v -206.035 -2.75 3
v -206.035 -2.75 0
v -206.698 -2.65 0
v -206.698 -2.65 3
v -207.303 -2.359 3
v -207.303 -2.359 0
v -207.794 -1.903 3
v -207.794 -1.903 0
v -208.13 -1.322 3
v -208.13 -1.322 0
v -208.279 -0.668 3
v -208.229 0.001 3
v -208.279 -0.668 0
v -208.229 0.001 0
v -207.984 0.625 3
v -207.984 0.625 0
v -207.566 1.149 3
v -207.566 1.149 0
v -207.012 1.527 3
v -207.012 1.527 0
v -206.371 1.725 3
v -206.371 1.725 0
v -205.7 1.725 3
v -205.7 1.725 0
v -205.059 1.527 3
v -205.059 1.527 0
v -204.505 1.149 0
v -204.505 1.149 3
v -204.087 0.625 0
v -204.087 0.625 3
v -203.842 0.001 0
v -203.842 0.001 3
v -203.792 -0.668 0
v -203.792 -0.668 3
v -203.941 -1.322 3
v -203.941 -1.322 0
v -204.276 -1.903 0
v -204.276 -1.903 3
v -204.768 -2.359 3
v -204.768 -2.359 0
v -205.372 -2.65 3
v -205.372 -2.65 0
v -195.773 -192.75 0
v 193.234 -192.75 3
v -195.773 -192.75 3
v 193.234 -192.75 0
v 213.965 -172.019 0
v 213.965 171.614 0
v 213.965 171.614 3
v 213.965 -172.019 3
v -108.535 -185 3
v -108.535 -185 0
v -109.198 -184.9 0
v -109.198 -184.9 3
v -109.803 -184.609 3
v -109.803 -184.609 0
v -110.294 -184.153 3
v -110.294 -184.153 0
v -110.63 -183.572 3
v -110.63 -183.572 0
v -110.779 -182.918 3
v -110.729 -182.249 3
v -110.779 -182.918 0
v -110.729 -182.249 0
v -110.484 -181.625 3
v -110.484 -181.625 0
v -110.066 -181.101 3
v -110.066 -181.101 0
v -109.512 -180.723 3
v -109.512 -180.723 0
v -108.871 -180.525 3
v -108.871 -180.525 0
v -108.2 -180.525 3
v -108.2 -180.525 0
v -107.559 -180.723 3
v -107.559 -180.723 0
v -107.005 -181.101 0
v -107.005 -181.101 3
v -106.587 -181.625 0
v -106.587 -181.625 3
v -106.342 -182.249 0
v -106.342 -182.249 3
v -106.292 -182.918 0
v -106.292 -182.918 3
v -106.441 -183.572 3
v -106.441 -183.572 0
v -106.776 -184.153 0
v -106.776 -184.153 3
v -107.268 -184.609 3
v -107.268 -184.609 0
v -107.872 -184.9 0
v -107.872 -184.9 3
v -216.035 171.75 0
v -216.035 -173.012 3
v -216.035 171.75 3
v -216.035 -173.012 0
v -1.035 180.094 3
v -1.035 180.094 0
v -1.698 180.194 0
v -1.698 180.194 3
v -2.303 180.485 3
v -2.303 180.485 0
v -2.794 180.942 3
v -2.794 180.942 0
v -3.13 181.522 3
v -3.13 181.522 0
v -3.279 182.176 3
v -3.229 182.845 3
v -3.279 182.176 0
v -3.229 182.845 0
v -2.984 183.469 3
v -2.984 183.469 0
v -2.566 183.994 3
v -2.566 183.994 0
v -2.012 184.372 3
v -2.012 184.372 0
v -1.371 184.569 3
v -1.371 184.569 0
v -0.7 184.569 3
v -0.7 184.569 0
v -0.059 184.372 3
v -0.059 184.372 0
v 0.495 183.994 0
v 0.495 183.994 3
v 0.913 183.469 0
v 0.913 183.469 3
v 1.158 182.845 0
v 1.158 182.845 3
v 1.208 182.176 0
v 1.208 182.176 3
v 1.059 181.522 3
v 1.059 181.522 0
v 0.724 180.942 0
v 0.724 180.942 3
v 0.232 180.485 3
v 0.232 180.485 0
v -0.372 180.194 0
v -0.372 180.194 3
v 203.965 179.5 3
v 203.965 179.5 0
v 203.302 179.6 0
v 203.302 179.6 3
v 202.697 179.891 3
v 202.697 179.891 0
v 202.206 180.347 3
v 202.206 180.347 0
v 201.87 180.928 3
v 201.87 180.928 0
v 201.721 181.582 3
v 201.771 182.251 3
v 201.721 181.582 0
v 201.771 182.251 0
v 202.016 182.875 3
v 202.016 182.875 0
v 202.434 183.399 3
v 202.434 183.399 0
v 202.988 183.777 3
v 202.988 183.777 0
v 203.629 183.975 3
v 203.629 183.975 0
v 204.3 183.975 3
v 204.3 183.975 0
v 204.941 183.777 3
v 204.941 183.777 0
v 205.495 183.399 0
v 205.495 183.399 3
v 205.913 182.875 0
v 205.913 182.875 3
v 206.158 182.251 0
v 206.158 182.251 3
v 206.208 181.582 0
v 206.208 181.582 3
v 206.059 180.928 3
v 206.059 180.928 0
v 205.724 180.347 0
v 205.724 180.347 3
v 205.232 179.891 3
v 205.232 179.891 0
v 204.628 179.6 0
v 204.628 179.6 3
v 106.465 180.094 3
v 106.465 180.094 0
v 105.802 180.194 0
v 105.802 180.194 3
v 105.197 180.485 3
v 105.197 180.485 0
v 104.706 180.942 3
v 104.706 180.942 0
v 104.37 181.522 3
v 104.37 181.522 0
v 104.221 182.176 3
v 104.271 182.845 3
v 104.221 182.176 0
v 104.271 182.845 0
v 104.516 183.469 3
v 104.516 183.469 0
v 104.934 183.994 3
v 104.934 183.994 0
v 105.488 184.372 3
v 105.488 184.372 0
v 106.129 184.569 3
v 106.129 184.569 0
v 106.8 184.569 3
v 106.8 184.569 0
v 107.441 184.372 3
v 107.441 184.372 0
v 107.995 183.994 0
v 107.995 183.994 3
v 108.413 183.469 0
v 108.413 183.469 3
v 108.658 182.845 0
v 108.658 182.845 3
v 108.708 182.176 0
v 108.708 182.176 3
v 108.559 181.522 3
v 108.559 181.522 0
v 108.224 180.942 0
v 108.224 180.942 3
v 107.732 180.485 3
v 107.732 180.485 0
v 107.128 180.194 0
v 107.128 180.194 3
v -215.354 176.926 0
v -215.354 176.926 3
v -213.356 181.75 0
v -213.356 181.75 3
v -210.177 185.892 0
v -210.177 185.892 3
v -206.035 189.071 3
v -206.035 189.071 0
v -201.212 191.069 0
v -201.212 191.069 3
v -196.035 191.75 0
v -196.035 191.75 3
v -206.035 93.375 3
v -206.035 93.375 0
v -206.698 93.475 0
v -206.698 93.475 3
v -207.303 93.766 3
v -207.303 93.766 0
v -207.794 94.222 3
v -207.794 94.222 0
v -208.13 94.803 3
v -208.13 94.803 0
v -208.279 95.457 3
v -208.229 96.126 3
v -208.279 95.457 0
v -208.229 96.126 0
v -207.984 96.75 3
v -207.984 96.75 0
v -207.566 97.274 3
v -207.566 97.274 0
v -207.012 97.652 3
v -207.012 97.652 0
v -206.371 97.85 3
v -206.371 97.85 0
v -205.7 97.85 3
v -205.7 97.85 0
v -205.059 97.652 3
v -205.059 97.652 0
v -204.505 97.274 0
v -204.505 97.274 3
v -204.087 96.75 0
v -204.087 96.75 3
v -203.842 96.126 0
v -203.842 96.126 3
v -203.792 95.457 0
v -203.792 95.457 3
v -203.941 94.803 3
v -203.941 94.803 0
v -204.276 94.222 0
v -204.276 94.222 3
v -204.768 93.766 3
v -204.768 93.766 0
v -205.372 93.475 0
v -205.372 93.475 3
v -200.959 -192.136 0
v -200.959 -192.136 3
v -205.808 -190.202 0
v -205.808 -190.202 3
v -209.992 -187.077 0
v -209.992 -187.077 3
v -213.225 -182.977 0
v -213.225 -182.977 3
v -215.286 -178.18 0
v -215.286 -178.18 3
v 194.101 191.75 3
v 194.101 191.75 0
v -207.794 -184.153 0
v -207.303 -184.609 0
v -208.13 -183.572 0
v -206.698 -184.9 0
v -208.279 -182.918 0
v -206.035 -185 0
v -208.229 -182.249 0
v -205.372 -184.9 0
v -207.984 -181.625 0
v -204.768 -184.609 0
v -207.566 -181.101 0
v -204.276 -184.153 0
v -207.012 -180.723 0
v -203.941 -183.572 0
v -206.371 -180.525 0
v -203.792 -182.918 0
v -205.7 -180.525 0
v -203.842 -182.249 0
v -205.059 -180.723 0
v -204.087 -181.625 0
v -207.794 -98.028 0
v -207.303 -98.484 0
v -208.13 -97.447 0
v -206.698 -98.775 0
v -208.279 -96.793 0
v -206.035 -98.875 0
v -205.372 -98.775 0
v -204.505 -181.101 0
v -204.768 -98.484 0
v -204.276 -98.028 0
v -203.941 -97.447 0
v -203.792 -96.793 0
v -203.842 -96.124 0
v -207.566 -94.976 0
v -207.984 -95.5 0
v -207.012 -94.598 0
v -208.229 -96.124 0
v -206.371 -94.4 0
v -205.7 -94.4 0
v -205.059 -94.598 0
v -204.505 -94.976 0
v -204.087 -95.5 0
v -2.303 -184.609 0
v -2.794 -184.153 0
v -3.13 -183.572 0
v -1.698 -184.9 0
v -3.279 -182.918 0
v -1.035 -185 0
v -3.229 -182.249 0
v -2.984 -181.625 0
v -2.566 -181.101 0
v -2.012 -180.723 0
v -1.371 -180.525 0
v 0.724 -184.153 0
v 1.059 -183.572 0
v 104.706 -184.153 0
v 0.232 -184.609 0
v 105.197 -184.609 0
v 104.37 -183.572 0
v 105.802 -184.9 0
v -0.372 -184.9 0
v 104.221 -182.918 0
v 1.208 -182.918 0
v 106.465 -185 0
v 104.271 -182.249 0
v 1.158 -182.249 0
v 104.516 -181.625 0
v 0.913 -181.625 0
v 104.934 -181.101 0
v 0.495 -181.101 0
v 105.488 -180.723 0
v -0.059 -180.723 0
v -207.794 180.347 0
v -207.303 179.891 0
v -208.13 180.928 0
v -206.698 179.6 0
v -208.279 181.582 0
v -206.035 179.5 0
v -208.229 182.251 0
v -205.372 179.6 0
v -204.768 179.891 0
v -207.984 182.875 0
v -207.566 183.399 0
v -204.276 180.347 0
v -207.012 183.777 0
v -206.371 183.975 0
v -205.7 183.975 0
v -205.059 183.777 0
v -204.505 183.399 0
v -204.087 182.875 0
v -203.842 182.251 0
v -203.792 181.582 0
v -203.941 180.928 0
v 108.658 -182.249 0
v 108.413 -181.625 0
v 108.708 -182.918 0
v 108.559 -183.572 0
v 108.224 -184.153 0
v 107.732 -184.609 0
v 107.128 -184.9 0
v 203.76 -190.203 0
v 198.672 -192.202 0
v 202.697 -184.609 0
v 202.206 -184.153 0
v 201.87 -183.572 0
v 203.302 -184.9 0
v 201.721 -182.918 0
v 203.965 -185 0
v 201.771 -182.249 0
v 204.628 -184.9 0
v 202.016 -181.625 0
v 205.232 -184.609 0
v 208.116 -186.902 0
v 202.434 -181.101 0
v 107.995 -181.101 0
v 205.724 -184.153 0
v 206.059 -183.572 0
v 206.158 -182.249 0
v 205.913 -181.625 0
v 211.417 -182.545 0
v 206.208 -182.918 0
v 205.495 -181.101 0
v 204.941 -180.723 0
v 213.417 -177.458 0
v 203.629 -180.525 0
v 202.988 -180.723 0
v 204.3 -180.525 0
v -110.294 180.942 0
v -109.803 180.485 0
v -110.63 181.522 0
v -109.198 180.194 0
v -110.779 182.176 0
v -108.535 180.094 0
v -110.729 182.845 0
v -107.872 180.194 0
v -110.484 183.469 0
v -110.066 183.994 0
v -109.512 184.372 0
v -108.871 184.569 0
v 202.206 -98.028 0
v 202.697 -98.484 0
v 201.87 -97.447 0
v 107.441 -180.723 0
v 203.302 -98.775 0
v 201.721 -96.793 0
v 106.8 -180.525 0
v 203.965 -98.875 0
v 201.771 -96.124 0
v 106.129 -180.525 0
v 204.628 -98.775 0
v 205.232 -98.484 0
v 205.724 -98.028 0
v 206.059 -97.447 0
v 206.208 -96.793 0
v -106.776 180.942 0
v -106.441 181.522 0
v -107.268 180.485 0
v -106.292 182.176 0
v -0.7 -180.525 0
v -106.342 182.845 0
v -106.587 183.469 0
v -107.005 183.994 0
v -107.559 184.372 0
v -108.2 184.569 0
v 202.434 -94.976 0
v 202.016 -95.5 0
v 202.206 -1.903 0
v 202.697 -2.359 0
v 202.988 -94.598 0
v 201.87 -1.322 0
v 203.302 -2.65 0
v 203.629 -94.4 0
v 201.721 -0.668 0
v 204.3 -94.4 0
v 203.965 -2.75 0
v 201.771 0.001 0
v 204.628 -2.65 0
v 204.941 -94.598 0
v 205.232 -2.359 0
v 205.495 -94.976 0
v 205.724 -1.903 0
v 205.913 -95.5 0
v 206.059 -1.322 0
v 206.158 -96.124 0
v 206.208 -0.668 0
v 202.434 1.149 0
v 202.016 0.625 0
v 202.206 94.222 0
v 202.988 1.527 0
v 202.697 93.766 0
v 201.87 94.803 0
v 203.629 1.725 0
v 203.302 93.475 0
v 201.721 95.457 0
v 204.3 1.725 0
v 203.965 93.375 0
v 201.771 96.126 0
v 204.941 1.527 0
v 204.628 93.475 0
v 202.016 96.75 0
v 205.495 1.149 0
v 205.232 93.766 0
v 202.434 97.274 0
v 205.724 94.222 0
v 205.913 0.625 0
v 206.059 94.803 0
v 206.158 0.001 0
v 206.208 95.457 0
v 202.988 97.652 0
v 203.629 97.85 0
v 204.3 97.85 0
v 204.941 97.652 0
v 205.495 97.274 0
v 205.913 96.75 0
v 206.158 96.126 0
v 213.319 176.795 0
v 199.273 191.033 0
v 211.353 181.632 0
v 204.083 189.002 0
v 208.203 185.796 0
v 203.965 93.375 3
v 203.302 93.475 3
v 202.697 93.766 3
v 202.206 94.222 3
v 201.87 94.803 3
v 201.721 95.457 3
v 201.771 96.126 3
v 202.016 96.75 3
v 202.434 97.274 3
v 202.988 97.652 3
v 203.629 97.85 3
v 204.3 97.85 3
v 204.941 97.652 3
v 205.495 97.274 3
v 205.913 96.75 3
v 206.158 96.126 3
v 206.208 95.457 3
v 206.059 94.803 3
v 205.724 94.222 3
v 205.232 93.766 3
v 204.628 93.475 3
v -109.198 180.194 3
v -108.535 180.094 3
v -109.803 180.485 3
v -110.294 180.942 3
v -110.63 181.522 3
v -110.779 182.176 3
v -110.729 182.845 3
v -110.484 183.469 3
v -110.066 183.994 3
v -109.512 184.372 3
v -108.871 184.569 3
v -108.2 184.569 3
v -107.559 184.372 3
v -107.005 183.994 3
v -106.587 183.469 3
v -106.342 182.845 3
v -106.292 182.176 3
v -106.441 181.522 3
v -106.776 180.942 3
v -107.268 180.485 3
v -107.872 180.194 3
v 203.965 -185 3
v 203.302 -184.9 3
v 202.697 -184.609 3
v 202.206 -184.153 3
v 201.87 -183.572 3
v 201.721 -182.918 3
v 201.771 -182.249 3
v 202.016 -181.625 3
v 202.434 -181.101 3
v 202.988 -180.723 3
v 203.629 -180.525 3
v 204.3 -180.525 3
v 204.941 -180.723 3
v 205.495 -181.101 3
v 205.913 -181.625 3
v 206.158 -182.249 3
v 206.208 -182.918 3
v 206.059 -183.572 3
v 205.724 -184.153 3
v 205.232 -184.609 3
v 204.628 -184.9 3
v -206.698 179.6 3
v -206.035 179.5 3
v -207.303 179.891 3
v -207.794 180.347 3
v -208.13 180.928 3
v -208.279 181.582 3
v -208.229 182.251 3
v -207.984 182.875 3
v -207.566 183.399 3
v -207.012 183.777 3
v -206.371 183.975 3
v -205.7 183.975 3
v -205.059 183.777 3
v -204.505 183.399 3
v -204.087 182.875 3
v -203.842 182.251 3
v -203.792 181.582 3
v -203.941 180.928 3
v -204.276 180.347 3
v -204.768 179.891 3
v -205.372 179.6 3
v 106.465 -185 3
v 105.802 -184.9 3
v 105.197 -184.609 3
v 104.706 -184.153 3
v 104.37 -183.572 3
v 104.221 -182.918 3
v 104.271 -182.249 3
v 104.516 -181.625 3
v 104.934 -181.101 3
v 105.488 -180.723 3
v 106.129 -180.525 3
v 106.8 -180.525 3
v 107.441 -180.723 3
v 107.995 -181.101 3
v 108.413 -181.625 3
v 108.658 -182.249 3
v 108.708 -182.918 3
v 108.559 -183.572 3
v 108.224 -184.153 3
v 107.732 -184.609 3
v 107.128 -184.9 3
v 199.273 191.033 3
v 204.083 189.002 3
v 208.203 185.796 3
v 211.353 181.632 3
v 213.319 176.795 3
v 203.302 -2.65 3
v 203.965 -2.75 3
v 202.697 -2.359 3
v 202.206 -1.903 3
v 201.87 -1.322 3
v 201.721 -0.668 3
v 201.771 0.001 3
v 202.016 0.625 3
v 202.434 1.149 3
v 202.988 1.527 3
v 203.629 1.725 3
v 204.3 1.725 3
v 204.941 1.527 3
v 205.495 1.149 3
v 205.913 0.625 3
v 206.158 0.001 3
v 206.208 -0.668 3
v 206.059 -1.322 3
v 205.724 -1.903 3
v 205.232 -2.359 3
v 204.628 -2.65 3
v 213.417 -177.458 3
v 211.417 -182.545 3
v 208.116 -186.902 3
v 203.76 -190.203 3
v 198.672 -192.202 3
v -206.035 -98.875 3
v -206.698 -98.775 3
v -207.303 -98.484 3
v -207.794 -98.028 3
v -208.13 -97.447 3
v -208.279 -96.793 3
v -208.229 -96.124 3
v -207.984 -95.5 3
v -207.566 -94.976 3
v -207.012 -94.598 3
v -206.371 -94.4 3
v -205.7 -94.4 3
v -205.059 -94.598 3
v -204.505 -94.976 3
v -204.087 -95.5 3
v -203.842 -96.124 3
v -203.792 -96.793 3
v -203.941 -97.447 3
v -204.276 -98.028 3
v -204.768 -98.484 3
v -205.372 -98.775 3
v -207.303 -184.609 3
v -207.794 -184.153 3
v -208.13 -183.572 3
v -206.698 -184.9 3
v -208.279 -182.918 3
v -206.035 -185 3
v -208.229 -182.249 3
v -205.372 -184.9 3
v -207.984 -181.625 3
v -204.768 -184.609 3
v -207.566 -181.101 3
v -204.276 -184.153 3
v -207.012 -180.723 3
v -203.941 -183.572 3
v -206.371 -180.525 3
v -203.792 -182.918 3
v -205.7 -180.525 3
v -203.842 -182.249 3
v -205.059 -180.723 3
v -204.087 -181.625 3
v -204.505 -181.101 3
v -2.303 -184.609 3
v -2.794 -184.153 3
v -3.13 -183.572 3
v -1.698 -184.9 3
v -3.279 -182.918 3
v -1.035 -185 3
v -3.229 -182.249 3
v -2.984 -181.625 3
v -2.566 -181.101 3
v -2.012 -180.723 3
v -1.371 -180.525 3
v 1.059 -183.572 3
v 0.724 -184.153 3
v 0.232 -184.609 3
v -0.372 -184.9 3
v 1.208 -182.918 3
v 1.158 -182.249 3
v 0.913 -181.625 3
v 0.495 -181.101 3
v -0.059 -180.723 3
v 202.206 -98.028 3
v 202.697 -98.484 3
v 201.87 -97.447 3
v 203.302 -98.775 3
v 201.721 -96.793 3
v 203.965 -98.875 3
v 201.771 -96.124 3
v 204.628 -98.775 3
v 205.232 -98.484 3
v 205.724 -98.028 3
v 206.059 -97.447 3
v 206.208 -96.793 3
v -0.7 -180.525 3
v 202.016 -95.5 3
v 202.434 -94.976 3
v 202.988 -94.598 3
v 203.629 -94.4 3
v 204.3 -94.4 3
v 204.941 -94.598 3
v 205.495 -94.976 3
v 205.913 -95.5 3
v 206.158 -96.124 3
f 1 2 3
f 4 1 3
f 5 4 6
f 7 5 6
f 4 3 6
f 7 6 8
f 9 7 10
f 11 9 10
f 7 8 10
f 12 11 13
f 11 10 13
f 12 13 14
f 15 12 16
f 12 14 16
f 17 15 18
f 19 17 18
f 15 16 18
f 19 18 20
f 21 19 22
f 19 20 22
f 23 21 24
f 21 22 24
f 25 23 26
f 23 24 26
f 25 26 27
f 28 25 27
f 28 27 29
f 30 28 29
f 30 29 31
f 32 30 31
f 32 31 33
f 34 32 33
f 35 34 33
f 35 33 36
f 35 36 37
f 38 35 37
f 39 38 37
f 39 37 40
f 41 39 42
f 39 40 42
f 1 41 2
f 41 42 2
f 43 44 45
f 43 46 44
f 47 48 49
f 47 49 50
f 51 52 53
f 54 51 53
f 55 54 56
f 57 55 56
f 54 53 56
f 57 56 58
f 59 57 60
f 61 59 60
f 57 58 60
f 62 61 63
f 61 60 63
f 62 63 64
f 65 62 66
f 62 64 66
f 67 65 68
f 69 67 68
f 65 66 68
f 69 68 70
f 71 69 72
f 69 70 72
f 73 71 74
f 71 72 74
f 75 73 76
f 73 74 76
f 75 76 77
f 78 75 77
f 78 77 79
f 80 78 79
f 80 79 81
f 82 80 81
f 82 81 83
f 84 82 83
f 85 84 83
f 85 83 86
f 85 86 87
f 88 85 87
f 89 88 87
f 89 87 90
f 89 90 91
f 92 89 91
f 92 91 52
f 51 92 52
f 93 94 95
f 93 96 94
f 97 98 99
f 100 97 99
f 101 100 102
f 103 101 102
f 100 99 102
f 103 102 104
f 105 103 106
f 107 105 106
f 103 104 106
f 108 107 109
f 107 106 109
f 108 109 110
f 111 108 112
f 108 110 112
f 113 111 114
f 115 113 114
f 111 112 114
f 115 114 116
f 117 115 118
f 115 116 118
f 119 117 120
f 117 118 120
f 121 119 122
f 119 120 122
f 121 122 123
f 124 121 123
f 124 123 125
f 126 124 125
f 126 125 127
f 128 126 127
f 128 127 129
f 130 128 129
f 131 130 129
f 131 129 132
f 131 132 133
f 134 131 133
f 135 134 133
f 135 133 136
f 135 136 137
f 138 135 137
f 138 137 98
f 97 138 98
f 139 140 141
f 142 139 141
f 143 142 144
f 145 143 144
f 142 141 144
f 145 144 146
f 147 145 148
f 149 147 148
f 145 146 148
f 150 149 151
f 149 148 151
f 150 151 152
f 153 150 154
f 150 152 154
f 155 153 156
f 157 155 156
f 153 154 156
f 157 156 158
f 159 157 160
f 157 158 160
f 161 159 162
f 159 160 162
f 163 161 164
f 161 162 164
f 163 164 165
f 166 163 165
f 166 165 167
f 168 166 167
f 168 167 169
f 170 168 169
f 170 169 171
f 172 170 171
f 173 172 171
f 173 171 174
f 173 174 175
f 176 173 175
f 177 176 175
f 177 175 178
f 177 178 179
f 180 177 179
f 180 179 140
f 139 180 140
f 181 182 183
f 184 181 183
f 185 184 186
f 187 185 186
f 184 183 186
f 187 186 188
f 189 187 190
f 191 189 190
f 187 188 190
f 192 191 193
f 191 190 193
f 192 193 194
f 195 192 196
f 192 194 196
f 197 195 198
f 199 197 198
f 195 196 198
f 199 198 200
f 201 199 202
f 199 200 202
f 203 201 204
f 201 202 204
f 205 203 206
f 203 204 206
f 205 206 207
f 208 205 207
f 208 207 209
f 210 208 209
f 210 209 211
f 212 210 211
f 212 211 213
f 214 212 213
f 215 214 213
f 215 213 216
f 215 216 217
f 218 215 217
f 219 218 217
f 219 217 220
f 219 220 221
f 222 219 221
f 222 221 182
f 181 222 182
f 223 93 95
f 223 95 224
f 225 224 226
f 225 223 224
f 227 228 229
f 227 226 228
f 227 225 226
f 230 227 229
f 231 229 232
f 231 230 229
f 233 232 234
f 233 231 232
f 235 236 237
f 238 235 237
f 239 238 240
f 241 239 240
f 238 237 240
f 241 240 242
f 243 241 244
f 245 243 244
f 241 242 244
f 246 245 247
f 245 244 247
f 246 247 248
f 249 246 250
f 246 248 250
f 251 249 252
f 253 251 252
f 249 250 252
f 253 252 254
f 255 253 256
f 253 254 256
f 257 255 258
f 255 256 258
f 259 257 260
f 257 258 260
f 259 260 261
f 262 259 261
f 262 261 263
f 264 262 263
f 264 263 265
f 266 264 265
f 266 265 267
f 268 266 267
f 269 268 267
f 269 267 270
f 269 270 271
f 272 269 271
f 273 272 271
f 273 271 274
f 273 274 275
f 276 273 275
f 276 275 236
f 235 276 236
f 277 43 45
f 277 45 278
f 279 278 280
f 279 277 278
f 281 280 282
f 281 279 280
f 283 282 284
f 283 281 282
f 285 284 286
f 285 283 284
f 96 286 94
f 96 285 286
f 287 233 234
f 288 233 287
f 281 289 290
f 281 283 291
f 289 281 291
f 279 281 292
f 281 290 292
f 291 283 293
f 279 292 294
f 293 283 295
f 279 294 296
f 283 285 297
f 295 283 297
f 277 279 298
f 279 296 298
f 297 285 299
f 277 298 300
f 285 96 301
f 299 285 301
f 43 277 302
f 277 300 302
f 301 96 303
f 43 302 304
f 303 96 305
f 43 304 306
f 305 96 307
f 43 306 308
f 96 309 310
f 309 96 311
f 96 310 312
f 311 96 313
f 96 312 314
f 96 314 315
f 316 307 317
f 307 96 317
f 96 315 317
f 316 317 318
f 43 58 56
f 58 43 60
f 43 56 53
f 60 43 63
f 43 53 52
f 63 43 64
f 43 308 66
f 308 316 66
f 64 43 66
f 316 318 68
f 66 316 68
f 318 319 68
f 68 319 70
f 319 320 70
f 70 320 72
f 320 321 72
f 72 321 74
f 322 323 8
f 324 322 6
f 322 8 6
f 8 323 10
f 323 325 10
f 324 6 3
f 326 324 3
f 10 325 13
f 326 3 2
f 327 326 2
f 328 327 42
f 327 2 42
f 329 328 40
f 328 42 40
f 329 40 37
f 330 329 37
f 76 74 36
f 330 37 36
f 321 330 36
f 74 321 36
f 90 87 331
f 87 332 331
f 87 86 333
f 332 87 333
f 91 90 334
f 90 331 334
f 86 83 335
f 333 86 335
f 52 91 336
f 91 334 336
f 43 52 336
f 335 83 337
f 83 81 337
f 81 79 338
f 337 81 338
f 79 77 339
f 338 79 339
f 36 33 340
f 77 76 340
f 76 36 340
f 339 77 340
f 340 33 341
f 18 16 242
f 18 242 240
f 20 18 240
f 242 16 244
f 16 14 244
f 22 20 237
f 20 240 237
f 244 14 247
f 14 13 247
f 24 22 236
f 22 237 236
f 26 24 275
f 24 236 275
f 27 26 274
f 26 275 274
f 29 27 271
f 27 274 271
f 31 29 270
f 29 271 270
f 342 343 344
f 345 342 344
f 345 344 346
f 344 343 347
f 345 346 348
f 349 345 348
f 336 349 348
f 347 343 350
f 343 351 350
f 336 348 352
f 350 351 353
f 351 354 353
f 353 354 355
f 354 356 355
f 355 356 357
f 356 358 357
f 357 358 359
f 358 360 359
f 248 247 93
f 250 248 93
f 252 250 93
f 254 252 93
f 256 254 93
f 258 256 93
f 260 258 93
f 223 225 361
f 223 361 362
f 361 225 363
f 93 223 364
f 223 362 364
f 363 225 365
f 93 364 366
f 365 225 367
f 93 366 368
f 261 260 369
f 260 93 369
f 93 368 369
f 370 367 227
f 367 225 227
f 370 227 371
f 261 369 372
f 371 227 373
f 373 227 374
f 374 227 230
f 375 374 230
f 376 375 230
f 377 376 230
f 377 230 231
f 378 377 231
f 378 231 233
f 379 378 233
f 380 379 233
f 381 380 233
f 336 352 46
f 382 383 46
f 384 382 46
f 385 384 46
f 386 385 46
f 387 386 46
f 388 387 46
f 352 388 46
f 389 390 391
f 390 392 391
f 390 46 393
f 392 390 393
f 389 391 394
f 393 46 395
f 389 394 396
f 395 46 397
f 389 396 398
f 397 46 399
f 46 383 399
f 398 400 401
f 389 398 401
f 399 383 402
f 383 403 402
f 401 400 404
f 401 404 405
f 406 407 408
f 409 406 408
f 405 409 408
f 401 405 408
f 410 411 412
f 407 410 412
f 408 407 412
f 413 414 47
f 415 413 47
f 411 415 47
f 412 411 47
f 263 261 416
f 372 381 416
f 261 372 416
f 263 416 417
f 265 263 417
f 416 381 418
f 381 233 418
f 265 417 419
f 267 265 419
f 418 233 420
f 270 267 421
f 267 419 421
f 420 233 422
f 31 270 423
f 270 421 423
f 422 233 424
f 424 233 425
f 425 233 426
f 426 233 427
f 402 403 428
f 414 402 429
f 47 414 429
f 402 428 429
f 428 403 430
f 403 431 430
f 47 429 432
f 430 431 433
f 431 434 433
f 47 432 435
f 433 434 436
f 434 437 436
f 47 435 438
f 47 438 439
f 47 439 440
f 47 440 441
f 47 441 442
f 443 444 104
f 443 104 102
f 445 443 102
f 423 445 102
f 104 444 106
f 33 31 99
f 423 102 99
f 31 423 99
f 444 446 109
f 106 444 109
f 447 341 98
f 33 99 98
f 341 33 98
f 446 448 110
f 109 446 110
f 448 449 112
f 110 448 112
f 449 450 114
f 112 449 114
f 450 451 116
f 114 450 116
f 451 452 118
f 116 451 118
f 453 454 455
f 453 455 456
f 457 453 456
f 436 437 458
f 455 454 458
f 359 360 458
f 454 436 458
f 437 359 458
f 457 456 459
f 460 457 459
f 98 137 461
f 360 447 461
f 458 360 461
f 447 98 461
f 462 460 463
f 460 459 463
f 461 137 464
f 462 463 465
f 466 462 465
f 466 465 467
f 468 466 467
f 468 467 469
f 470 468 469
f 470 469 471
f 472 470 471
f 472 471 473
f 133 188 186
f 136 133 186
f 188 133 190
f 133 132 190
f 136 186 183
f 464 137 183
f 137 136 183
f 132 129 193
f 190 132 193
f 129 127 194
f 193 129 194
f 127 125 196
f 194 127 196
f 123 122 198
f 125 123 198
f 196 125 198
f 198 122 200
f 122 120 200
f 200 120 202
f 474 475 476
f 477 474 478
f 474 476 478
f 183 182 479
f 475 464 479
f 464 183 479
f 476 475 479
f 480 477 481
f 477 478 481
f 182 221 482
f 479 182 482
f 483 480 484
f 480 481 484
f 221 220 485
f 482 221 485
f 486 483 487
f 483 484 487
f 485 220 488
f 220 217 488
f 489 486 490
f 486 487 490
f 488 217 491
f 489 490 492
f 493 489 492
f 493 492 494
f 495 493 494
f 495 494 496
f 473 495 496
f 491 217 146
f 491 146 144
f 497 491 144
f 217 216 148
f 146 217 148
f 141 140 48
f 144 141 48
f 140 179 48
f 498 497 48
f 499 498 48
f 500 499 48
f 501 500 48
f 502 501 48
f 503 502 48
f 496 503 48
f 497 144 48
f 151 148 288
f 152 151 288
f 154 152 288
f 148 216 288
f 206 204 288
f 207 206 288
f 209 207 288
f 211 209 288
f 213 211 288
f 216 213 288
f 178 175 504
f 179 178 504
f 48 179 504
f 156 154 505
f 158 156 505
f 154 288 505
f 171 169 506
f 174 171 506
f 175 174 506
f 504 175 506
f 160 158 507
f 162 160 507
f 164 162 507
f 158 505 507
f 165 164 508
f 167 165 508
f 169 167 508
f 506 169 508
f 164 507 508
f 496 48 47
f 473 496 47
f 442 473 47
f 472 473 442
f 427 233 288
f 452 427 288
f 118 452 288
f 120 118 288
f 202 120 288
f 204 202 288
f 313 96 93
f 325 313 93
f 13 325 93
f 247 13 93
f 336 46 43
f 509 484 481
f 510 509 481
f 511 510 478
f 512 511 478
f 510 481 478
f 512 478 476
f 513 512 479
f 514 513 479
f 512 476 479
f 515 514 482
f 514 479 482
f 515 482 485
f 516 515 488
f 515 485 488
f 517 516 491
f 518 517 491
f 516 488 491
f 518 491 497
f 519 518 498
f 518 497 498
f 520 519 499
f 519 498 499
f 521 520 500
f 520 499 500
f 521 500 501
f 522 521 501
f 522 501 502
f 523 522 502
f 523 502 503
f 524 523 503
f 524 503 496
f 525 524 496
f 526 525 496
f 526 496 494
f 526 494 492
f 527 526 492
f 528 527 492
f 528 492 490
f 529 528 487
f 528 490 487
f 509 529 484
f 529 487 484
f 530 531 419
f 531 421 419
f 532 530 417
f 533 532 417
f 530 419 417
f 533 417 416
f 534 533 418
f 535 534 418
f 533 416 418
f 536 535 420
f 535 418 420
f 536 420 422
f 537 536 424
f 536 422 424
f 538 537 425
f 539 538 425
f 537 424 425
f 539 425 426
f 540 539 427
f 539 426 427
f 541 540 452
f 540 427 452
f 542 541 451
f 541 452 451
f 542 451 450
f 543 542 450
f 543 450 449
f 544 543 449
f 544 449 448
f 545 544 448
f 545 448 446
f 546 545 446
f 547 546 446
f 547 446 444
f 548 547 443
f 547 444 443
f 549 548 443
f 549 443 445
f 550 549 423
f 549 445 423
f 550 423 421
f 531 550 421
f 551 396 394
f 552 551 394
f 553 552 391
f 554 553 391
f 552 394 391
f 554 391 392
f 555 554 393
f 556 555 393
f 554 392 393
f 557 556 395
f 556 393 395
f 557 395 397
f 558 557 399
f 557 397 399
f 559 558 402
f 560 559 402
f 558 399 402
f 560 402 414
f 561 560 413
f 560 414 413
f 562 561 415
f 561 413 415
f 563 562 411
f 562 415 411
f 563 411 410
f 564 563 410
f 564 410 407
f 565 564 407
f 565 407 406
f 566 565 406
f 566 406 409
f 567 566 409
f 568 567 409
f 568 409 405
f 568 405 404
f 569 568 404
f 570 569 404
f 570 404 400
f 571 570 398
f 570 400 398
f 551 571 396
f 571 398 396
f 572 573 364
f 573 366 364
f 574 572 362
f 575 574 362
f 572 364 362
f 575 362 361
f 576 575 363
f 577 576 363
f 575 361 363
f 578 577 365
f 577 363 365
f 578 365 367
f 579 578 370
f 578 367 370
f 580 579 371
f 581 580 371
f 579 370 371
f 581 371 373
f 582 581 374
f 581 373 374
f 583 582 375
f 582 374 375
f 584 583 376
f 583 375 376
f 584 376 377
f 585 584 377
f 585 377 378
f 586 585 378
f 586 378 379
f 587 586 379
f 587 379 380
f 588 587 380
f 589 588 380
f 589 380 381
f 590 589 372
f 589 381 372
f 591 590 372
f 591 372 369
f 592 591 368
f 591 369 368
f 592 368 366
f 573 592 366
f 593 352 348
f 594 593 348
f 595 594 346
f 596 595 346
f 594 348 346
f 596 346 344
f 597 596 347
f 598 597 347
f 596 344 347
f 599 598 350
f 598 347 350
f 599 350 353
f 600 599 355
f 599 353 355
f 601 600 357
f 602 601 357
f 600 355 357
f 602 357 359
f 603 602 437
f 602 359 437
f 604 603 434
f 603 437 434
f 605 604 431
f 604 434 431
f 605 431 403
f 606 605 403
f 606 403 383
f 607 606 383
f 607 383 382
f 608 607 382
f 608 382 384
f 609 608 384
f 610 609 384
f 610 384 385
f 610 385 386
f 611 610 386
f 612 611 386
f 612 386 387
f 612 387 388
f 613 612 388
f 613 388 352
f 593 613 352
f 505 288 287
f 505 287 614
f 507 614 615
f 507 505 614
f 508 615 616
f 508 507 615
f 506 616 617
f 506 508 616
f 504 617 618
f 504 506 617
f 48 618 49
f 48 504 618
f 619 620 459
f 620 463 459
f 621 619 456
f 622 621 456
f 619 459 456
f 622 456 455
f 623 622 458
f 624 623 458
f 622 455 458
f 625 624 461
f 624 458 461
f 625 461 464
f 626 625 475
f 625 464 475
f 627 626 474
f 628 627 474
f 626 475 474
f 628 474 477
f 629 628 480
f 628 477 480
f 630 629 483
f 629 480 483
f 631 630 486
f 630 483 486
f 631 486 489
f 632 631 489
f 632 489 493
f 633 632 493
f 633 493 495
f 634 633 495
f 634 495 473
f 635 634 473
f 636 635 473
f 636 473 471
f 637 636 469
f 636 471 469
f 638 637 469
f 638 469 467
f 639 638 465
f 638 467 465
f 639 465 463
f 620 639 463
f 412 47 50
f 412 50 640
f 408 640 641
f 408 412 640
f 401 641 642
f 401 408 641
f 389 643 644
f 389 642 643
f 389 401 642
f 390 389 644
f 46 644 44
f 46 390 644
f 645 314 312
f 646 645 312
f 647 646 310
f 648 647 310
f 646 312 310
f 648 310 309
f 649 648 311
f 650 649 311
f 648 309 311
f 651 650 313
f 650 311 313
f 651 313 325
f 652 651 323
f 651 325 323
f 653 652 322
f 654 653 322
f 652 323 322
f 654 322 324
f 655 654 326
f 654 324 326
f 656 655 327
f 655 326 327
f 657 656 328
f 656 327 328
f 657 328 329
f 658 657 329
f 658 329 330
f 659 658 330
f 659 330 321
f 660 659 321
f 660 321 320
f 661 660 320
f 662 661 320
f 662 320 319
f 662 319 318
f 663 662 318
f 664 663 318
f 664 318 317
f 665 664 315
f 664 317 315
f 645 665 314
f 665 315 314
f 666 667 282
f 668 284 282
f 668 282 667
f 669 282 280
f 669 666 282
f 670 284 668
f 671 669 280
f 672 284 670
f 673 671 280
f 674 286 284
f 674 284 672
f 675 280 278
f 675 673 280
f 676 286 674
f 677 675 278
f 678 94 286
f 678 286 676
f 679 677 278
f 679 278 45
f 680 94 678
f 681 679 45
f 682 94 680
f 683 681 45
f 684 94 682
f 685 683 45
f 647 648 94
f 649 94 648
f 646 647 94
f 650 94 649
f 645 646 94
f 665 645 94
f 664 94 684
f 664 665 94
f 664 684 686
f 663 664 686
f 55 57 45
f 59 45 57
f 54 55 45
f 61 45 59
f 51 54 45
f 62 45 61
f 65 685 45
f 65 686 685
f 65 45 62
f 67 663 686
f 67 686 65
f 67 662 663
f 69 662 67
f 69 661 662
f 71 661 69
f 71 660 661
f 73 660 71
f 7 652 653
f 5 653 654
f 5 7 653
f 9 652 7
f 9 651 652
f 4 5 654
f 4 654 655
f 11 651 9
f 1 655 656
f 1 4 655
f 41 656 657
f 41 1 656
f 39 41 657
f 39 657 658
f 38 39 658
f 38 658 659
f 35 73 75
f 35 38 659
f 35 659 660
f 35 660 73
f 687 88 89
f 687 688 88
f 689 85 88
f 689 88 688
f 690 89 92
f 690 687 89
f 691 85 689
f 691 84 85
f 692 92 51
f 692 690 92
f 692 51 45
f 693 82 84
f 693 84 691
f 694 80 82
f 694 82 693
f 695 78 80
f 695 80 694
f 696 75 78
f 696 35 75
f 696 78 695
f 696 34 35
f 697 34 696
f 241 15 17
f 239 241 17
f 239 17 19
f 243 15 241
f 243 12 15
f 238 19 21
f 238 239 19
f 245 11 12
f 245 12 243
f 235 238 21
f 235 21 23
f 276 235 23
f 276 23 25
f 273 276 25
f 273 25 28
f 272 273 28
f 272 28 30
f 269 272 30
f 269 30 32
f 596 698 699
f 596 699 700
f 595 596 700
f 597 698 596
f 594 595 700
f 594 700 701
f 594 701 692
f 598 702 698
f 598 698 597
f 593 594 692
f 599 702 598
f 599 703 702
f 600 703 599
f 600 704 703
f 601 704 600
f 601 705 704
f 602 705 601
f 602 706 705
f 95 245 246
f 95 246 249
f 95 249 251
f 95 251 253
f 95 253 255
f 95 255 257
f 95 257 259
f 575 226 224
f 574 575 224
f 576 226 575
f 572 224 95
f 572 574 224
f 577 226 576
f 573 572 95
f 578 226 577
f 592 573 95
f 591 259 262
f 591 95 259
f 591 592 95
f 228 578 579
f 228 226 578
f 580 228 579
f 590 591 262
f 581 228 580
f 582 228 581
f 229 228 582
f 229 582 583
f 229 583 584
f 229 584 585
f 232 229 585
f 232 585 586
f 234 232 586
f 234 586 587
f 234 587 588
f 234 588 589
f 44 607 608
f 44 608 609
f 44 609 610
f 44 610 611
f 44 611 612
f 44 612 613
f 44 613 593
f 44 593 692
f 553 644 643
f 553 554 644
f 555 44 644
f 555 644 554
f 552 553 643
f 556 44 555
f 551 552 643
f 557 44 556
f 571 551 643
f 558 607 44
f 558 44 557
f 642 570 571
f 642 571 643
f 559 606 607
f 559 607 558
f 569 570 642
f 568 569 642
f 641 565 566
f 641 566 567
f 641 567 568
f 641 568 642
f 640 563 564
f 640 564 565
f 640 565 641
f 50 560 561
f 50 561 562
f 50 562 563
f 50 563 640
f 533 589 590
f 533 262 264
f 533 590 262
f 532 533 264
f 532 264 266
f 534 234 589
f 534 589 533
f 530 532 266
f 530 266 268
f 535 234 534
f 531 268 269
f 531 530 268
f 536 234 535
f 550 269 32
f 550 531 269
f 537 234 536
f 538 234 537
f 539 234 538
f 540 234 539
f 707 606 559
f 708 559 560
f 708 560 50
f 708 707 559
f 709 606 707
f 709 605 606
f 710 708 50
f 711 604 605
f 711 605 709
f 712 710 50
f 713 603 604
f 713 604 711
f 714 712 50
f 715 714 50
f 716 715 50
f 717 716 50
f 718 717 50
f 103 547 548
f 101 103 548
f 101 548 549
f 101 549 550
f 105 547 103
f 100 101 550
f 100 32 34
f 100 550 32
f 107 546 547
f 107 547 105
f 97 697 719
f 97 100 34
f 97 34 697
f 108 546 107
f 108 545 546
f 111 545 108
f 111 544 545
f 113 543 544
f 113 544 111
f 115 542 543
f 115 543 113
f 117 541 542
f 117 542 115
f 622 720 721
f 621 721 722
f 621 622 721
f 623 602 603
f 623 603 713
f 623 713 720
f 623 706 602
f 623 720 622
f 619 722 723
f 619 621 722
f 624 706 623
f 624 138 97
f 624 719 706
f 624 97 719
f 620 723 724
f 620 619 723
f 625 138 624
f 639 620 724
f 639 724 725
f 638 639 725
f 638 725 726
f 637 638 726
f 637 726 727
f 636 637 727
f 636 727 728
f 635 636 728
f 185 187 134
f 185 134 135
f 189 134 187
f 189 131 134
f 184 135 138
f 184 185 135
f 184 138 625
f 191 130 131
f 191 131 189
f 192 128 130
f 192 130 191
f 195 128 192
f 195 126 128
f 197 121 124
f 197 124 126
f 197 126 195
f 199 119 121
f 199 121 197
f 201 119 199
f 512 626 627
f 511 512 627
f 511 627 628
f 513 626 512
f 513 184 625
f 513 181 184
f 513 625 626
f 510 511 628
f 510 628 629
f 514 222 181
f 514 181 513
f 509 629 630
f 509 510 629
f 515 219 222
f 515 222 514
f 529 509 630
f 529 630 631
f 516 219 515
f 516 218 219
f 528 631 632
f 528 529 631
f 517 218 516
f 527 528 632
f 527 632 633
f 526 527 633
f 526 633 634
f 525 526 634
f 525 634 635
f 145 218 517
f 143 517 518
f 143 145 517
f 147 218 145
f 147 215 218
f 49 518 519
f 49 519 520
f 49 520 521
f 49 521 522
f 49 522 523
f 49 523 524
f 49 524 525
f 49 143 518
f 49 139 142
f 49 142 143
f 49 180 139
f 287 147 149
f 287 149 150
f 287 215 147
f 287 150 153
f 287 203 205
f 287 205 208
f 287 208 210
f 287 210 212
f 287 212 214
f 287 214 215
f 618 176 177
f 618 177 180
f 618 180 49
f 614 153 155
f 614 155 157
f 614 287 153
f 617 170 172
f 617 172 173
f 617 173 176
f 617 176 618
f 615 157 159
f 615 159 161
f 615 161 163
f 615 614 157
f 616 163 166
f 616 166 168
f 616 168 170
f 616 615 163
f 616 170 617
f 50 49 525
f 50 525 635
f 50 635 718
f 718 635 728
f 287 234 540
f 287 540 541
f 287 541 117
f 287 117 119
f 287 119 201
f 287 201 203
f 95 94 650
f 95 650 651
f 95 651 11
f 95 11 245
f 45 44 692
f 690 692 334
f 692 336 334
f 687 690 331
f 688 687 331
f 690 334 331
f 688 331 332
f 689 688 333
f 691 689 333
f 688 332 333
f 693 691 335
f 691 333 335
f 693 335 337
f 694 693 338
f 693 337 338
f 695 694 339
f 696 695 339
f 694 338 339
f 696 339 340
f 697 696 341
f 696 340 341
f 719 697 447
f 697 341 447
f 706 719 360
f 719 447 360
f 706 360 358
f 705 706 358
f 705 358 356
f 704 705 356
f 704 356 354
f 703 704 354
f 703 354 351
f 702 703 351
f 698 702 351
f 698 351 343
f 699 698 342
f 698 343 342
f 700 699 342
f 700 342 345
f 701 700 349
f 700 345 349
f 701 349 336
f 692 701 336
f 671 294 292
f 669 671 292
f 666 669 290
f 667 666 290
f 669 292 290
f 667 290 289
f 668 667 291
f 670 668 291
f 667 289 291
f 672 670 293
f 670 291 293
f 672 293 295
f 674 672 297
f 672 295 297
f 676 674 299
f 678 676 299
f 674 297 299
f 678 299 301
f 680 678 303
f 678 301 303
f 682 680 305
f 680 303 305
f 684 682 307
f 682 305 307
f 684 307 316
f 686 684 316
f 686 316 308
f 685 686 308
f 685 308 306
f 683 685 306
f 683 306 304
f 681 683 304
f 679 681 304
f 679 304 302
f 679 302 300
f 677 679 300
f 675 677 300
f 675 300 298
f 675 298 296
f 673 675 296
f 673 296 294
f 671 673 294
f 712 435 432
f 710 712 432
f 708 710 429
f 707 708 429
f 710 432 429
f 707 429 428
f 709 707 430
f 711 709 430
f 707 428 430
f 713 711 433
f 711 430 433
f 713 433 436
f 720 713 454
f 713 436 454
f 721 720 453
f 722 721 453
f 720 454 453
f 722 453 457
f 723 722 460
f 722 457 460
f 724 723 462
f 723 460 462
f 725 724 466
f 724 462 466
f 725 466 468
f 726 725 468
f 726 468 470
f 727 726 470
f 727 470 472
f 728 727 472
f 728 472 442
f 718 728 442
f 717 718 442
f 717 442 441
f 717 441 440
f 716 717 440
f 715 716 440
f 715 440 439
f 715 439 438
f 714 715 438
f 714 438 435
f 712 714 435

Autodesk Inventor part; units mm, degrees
ref_plane "YZ Plane" through (0, 0, 0) normal (1, 0, 0) x (0, 1, 0)
ref_plane "XZ Plane" through (0, 0, 0) normal (0, 1, 0) x (-1, 0, 0)
ref_plane "XY Plane" through (0, 0, 0) normal (0, 0, 1) x (1, 0, 0)
sketch "Sketch1" plane through (0, 0, 0) normal (0, 0, 1) x (1, 0, 0)
  line L0 (-196.0353, 191.75) -> (194.1012, 191.75)
  line L1 (213.9647, 171.6135) -> (213.9647, -172.019)
  line L2 (193.2337, -192.75) -> (-195.7732, -192.75)
  line L3 (-216.0353, -173.0121) -> (-216.0353, 171.75)
  line L4 (-205, 191.75) -> (205, -191.75) construction
  line L5 (205, 191.75) -> (-205, -191.75) construction
  arc A0 (-196.0353, 191.75) -> (-216.0353, 171.75) centre (-196.0353, 171.75) ccw
  arc A1 (-216.0353, -173.0121) -> (-195.7732, -192.75) centre (-196.0353, -172.75) ccw
  arc A2 (213.9647, 171.6135) -> (194.1012, 191.75) centre (193.9647, 171.75) ccw
  arc A3 (193.2337, -192.75) -> (213.9647, -172.019) centre (193.9647, -172.75) ccw
  point P0 (0, 0)
  dimension "d2" = 40
  dimension "d16" = 430
  dimension "d17" = 384.5
  dimension "d18" = 20
  dimension "d19" = 20
  dimension "d20" = 20
  dimension "d21" = 20
  dimension "d22" = 20
  dimension "d23" = 20
extrude "Extrusion1" add sketch "Sketch1" along normal blind 3
sketch "Sketch2" plane through (0, 0, 3) normal (0, 0, 1) x (1, 0, 0)
  line L0 (194.1012, 191.75) -> (-196.0353, 191.75) projected
  arc A0 (-196.0353, 191.75) -> (-216.0353, 171.75) centre (-196.0353, 171.75) ccw projected
  line L1 (-216.0353, 171.75) -> (-216.0353, -173.0121) projected
  arc A1 (-216.0353, -173.0121) -> (-195.7732, -192.75) centre (-196.0353, -172.75) ccw projected
  line L2 (-195.7732, -192.75) -> (193.2337, -192.75) projected
  arc A2 (193.2337, -192.75) -> (213.9647, -172.019) centre (193.9647, -172.75) ccw projected
  line L3 (213.9647, -172.019) -> (213.9647, 171.6135) projected
  arc A3 (213.9647, 171.6135) -> (194.1012, 191.75) centre (193.9647, 171.75) ccw projected
  line L4 (-29.4365, -0.5) -> (27.4029, -0.5)
  line L5 (-1.0353, 26.0167) -> (-1.0353, -40.6326)
  point P0 (0, 0)
  point P1 (-206.0353, -182.75)
  point P2 (203.9647, -182.75)
  point P3 (-206.0353, 181.75)
  point P4 (203.9647, 181.75)
  dimension "d6" = 10
  dimension "d7" = 10
  dimension "d24" = 10
  dimension "d25" = 10
  dimension "d26" = 10
  dimension "d27" = 10
  dimension "d28" = 10
  dimension "d29" = 10
hole "Hole1" at (-206.0353, -182.75, 3) at (203.9647, -182.75, 3) at (-206.0353, 181.75, 3) at (203.9647, 181.75, 3) direction (0, 0, -1) diameter 4.5 end through all
sketch "Sketch3" plane through (0, 0, 3) normal (0, 0, 1) x (1, 0, 0)
  line L0 (-195.7732, -192.75) -> (193.2337, -192.75) projected
  line L1 (-216.0353, 171.75) -> (-216.0353, -173.0121) projected
  line L2 (194.1012, 191.75) -> (-196.0353, 191.75) projected
  line L3 (213.9647, -172.019) -> (213.9647, 171.6135) projected
  line L4 (-112.0022, -0.2028) -> (58.7226, -0.2028)
  line L5 (-1.0353, -182.75) -> (-1.0353, -118.948)
  point P0 (0, 0)
  point P1 (-108.5353, -182.75)
  point P2 (-206.0353, -96.625)
  point P3 (-206.0353, 95.625)
  point P4 (-206.0353, -0.5)
  point P5 (106.4647, -182.75)
  point P6 (-108.5353, 182.3444)
  point P7 (106.4647, 182.3444)
  point P8 (-1.0353, 182.3444)
  point P9 (203.9647, -96.625)
  point P10 (203.9647, 95.625)
  point P11 (203.9647, -0.5)
  dimension "d30" = 10
  dimension "d31" = 10
  dimension "d38" = 384.5
  dimension "d41" = 288.375
  dimension "d42" = 192.25
  dimension "d43" = 96.125
  dimension "d44" = 430
  dimension "d45" = 107.5
  dimension "d46" = 215
  dimension "d47" = 322.5
hole "Hole2" at (-108.5353, -182.75, 3) at (-206.0353, -96.625, 3) at (-206.0353, 95.625, 3) at (-206.0353, -0.5, 3) at (106.4647, -182.75, 3) at (-1.0353, -182.75, 3) at (-108.5353, 182.3444, 3) at (-1.0353, 182.3444, 3) at (106.4647, 182.3444, 3) at (203.9647, 95.625, 3) at (203.9647, -0.5, 3) at (203.9647, -96.625, 3) direction (0, 0, -1) diameter 4.5 end through all
equation "\"d22\" = d19"
equation "\"d23\" = d20"
equation "\"d26\" = d7"
equation "\"d41\" = 0.75 * d38"
equation "\"d42\" = 0.5 * d38"
equation "\"d43\" = 0.25 * d38"
equation "\"d45\" = 0.25 * d44"
equation "\"d46\" = 0.5 * d44"
equation "\"d47\" = 0.75 * d44"
properties part number "right_pane_outerl"
